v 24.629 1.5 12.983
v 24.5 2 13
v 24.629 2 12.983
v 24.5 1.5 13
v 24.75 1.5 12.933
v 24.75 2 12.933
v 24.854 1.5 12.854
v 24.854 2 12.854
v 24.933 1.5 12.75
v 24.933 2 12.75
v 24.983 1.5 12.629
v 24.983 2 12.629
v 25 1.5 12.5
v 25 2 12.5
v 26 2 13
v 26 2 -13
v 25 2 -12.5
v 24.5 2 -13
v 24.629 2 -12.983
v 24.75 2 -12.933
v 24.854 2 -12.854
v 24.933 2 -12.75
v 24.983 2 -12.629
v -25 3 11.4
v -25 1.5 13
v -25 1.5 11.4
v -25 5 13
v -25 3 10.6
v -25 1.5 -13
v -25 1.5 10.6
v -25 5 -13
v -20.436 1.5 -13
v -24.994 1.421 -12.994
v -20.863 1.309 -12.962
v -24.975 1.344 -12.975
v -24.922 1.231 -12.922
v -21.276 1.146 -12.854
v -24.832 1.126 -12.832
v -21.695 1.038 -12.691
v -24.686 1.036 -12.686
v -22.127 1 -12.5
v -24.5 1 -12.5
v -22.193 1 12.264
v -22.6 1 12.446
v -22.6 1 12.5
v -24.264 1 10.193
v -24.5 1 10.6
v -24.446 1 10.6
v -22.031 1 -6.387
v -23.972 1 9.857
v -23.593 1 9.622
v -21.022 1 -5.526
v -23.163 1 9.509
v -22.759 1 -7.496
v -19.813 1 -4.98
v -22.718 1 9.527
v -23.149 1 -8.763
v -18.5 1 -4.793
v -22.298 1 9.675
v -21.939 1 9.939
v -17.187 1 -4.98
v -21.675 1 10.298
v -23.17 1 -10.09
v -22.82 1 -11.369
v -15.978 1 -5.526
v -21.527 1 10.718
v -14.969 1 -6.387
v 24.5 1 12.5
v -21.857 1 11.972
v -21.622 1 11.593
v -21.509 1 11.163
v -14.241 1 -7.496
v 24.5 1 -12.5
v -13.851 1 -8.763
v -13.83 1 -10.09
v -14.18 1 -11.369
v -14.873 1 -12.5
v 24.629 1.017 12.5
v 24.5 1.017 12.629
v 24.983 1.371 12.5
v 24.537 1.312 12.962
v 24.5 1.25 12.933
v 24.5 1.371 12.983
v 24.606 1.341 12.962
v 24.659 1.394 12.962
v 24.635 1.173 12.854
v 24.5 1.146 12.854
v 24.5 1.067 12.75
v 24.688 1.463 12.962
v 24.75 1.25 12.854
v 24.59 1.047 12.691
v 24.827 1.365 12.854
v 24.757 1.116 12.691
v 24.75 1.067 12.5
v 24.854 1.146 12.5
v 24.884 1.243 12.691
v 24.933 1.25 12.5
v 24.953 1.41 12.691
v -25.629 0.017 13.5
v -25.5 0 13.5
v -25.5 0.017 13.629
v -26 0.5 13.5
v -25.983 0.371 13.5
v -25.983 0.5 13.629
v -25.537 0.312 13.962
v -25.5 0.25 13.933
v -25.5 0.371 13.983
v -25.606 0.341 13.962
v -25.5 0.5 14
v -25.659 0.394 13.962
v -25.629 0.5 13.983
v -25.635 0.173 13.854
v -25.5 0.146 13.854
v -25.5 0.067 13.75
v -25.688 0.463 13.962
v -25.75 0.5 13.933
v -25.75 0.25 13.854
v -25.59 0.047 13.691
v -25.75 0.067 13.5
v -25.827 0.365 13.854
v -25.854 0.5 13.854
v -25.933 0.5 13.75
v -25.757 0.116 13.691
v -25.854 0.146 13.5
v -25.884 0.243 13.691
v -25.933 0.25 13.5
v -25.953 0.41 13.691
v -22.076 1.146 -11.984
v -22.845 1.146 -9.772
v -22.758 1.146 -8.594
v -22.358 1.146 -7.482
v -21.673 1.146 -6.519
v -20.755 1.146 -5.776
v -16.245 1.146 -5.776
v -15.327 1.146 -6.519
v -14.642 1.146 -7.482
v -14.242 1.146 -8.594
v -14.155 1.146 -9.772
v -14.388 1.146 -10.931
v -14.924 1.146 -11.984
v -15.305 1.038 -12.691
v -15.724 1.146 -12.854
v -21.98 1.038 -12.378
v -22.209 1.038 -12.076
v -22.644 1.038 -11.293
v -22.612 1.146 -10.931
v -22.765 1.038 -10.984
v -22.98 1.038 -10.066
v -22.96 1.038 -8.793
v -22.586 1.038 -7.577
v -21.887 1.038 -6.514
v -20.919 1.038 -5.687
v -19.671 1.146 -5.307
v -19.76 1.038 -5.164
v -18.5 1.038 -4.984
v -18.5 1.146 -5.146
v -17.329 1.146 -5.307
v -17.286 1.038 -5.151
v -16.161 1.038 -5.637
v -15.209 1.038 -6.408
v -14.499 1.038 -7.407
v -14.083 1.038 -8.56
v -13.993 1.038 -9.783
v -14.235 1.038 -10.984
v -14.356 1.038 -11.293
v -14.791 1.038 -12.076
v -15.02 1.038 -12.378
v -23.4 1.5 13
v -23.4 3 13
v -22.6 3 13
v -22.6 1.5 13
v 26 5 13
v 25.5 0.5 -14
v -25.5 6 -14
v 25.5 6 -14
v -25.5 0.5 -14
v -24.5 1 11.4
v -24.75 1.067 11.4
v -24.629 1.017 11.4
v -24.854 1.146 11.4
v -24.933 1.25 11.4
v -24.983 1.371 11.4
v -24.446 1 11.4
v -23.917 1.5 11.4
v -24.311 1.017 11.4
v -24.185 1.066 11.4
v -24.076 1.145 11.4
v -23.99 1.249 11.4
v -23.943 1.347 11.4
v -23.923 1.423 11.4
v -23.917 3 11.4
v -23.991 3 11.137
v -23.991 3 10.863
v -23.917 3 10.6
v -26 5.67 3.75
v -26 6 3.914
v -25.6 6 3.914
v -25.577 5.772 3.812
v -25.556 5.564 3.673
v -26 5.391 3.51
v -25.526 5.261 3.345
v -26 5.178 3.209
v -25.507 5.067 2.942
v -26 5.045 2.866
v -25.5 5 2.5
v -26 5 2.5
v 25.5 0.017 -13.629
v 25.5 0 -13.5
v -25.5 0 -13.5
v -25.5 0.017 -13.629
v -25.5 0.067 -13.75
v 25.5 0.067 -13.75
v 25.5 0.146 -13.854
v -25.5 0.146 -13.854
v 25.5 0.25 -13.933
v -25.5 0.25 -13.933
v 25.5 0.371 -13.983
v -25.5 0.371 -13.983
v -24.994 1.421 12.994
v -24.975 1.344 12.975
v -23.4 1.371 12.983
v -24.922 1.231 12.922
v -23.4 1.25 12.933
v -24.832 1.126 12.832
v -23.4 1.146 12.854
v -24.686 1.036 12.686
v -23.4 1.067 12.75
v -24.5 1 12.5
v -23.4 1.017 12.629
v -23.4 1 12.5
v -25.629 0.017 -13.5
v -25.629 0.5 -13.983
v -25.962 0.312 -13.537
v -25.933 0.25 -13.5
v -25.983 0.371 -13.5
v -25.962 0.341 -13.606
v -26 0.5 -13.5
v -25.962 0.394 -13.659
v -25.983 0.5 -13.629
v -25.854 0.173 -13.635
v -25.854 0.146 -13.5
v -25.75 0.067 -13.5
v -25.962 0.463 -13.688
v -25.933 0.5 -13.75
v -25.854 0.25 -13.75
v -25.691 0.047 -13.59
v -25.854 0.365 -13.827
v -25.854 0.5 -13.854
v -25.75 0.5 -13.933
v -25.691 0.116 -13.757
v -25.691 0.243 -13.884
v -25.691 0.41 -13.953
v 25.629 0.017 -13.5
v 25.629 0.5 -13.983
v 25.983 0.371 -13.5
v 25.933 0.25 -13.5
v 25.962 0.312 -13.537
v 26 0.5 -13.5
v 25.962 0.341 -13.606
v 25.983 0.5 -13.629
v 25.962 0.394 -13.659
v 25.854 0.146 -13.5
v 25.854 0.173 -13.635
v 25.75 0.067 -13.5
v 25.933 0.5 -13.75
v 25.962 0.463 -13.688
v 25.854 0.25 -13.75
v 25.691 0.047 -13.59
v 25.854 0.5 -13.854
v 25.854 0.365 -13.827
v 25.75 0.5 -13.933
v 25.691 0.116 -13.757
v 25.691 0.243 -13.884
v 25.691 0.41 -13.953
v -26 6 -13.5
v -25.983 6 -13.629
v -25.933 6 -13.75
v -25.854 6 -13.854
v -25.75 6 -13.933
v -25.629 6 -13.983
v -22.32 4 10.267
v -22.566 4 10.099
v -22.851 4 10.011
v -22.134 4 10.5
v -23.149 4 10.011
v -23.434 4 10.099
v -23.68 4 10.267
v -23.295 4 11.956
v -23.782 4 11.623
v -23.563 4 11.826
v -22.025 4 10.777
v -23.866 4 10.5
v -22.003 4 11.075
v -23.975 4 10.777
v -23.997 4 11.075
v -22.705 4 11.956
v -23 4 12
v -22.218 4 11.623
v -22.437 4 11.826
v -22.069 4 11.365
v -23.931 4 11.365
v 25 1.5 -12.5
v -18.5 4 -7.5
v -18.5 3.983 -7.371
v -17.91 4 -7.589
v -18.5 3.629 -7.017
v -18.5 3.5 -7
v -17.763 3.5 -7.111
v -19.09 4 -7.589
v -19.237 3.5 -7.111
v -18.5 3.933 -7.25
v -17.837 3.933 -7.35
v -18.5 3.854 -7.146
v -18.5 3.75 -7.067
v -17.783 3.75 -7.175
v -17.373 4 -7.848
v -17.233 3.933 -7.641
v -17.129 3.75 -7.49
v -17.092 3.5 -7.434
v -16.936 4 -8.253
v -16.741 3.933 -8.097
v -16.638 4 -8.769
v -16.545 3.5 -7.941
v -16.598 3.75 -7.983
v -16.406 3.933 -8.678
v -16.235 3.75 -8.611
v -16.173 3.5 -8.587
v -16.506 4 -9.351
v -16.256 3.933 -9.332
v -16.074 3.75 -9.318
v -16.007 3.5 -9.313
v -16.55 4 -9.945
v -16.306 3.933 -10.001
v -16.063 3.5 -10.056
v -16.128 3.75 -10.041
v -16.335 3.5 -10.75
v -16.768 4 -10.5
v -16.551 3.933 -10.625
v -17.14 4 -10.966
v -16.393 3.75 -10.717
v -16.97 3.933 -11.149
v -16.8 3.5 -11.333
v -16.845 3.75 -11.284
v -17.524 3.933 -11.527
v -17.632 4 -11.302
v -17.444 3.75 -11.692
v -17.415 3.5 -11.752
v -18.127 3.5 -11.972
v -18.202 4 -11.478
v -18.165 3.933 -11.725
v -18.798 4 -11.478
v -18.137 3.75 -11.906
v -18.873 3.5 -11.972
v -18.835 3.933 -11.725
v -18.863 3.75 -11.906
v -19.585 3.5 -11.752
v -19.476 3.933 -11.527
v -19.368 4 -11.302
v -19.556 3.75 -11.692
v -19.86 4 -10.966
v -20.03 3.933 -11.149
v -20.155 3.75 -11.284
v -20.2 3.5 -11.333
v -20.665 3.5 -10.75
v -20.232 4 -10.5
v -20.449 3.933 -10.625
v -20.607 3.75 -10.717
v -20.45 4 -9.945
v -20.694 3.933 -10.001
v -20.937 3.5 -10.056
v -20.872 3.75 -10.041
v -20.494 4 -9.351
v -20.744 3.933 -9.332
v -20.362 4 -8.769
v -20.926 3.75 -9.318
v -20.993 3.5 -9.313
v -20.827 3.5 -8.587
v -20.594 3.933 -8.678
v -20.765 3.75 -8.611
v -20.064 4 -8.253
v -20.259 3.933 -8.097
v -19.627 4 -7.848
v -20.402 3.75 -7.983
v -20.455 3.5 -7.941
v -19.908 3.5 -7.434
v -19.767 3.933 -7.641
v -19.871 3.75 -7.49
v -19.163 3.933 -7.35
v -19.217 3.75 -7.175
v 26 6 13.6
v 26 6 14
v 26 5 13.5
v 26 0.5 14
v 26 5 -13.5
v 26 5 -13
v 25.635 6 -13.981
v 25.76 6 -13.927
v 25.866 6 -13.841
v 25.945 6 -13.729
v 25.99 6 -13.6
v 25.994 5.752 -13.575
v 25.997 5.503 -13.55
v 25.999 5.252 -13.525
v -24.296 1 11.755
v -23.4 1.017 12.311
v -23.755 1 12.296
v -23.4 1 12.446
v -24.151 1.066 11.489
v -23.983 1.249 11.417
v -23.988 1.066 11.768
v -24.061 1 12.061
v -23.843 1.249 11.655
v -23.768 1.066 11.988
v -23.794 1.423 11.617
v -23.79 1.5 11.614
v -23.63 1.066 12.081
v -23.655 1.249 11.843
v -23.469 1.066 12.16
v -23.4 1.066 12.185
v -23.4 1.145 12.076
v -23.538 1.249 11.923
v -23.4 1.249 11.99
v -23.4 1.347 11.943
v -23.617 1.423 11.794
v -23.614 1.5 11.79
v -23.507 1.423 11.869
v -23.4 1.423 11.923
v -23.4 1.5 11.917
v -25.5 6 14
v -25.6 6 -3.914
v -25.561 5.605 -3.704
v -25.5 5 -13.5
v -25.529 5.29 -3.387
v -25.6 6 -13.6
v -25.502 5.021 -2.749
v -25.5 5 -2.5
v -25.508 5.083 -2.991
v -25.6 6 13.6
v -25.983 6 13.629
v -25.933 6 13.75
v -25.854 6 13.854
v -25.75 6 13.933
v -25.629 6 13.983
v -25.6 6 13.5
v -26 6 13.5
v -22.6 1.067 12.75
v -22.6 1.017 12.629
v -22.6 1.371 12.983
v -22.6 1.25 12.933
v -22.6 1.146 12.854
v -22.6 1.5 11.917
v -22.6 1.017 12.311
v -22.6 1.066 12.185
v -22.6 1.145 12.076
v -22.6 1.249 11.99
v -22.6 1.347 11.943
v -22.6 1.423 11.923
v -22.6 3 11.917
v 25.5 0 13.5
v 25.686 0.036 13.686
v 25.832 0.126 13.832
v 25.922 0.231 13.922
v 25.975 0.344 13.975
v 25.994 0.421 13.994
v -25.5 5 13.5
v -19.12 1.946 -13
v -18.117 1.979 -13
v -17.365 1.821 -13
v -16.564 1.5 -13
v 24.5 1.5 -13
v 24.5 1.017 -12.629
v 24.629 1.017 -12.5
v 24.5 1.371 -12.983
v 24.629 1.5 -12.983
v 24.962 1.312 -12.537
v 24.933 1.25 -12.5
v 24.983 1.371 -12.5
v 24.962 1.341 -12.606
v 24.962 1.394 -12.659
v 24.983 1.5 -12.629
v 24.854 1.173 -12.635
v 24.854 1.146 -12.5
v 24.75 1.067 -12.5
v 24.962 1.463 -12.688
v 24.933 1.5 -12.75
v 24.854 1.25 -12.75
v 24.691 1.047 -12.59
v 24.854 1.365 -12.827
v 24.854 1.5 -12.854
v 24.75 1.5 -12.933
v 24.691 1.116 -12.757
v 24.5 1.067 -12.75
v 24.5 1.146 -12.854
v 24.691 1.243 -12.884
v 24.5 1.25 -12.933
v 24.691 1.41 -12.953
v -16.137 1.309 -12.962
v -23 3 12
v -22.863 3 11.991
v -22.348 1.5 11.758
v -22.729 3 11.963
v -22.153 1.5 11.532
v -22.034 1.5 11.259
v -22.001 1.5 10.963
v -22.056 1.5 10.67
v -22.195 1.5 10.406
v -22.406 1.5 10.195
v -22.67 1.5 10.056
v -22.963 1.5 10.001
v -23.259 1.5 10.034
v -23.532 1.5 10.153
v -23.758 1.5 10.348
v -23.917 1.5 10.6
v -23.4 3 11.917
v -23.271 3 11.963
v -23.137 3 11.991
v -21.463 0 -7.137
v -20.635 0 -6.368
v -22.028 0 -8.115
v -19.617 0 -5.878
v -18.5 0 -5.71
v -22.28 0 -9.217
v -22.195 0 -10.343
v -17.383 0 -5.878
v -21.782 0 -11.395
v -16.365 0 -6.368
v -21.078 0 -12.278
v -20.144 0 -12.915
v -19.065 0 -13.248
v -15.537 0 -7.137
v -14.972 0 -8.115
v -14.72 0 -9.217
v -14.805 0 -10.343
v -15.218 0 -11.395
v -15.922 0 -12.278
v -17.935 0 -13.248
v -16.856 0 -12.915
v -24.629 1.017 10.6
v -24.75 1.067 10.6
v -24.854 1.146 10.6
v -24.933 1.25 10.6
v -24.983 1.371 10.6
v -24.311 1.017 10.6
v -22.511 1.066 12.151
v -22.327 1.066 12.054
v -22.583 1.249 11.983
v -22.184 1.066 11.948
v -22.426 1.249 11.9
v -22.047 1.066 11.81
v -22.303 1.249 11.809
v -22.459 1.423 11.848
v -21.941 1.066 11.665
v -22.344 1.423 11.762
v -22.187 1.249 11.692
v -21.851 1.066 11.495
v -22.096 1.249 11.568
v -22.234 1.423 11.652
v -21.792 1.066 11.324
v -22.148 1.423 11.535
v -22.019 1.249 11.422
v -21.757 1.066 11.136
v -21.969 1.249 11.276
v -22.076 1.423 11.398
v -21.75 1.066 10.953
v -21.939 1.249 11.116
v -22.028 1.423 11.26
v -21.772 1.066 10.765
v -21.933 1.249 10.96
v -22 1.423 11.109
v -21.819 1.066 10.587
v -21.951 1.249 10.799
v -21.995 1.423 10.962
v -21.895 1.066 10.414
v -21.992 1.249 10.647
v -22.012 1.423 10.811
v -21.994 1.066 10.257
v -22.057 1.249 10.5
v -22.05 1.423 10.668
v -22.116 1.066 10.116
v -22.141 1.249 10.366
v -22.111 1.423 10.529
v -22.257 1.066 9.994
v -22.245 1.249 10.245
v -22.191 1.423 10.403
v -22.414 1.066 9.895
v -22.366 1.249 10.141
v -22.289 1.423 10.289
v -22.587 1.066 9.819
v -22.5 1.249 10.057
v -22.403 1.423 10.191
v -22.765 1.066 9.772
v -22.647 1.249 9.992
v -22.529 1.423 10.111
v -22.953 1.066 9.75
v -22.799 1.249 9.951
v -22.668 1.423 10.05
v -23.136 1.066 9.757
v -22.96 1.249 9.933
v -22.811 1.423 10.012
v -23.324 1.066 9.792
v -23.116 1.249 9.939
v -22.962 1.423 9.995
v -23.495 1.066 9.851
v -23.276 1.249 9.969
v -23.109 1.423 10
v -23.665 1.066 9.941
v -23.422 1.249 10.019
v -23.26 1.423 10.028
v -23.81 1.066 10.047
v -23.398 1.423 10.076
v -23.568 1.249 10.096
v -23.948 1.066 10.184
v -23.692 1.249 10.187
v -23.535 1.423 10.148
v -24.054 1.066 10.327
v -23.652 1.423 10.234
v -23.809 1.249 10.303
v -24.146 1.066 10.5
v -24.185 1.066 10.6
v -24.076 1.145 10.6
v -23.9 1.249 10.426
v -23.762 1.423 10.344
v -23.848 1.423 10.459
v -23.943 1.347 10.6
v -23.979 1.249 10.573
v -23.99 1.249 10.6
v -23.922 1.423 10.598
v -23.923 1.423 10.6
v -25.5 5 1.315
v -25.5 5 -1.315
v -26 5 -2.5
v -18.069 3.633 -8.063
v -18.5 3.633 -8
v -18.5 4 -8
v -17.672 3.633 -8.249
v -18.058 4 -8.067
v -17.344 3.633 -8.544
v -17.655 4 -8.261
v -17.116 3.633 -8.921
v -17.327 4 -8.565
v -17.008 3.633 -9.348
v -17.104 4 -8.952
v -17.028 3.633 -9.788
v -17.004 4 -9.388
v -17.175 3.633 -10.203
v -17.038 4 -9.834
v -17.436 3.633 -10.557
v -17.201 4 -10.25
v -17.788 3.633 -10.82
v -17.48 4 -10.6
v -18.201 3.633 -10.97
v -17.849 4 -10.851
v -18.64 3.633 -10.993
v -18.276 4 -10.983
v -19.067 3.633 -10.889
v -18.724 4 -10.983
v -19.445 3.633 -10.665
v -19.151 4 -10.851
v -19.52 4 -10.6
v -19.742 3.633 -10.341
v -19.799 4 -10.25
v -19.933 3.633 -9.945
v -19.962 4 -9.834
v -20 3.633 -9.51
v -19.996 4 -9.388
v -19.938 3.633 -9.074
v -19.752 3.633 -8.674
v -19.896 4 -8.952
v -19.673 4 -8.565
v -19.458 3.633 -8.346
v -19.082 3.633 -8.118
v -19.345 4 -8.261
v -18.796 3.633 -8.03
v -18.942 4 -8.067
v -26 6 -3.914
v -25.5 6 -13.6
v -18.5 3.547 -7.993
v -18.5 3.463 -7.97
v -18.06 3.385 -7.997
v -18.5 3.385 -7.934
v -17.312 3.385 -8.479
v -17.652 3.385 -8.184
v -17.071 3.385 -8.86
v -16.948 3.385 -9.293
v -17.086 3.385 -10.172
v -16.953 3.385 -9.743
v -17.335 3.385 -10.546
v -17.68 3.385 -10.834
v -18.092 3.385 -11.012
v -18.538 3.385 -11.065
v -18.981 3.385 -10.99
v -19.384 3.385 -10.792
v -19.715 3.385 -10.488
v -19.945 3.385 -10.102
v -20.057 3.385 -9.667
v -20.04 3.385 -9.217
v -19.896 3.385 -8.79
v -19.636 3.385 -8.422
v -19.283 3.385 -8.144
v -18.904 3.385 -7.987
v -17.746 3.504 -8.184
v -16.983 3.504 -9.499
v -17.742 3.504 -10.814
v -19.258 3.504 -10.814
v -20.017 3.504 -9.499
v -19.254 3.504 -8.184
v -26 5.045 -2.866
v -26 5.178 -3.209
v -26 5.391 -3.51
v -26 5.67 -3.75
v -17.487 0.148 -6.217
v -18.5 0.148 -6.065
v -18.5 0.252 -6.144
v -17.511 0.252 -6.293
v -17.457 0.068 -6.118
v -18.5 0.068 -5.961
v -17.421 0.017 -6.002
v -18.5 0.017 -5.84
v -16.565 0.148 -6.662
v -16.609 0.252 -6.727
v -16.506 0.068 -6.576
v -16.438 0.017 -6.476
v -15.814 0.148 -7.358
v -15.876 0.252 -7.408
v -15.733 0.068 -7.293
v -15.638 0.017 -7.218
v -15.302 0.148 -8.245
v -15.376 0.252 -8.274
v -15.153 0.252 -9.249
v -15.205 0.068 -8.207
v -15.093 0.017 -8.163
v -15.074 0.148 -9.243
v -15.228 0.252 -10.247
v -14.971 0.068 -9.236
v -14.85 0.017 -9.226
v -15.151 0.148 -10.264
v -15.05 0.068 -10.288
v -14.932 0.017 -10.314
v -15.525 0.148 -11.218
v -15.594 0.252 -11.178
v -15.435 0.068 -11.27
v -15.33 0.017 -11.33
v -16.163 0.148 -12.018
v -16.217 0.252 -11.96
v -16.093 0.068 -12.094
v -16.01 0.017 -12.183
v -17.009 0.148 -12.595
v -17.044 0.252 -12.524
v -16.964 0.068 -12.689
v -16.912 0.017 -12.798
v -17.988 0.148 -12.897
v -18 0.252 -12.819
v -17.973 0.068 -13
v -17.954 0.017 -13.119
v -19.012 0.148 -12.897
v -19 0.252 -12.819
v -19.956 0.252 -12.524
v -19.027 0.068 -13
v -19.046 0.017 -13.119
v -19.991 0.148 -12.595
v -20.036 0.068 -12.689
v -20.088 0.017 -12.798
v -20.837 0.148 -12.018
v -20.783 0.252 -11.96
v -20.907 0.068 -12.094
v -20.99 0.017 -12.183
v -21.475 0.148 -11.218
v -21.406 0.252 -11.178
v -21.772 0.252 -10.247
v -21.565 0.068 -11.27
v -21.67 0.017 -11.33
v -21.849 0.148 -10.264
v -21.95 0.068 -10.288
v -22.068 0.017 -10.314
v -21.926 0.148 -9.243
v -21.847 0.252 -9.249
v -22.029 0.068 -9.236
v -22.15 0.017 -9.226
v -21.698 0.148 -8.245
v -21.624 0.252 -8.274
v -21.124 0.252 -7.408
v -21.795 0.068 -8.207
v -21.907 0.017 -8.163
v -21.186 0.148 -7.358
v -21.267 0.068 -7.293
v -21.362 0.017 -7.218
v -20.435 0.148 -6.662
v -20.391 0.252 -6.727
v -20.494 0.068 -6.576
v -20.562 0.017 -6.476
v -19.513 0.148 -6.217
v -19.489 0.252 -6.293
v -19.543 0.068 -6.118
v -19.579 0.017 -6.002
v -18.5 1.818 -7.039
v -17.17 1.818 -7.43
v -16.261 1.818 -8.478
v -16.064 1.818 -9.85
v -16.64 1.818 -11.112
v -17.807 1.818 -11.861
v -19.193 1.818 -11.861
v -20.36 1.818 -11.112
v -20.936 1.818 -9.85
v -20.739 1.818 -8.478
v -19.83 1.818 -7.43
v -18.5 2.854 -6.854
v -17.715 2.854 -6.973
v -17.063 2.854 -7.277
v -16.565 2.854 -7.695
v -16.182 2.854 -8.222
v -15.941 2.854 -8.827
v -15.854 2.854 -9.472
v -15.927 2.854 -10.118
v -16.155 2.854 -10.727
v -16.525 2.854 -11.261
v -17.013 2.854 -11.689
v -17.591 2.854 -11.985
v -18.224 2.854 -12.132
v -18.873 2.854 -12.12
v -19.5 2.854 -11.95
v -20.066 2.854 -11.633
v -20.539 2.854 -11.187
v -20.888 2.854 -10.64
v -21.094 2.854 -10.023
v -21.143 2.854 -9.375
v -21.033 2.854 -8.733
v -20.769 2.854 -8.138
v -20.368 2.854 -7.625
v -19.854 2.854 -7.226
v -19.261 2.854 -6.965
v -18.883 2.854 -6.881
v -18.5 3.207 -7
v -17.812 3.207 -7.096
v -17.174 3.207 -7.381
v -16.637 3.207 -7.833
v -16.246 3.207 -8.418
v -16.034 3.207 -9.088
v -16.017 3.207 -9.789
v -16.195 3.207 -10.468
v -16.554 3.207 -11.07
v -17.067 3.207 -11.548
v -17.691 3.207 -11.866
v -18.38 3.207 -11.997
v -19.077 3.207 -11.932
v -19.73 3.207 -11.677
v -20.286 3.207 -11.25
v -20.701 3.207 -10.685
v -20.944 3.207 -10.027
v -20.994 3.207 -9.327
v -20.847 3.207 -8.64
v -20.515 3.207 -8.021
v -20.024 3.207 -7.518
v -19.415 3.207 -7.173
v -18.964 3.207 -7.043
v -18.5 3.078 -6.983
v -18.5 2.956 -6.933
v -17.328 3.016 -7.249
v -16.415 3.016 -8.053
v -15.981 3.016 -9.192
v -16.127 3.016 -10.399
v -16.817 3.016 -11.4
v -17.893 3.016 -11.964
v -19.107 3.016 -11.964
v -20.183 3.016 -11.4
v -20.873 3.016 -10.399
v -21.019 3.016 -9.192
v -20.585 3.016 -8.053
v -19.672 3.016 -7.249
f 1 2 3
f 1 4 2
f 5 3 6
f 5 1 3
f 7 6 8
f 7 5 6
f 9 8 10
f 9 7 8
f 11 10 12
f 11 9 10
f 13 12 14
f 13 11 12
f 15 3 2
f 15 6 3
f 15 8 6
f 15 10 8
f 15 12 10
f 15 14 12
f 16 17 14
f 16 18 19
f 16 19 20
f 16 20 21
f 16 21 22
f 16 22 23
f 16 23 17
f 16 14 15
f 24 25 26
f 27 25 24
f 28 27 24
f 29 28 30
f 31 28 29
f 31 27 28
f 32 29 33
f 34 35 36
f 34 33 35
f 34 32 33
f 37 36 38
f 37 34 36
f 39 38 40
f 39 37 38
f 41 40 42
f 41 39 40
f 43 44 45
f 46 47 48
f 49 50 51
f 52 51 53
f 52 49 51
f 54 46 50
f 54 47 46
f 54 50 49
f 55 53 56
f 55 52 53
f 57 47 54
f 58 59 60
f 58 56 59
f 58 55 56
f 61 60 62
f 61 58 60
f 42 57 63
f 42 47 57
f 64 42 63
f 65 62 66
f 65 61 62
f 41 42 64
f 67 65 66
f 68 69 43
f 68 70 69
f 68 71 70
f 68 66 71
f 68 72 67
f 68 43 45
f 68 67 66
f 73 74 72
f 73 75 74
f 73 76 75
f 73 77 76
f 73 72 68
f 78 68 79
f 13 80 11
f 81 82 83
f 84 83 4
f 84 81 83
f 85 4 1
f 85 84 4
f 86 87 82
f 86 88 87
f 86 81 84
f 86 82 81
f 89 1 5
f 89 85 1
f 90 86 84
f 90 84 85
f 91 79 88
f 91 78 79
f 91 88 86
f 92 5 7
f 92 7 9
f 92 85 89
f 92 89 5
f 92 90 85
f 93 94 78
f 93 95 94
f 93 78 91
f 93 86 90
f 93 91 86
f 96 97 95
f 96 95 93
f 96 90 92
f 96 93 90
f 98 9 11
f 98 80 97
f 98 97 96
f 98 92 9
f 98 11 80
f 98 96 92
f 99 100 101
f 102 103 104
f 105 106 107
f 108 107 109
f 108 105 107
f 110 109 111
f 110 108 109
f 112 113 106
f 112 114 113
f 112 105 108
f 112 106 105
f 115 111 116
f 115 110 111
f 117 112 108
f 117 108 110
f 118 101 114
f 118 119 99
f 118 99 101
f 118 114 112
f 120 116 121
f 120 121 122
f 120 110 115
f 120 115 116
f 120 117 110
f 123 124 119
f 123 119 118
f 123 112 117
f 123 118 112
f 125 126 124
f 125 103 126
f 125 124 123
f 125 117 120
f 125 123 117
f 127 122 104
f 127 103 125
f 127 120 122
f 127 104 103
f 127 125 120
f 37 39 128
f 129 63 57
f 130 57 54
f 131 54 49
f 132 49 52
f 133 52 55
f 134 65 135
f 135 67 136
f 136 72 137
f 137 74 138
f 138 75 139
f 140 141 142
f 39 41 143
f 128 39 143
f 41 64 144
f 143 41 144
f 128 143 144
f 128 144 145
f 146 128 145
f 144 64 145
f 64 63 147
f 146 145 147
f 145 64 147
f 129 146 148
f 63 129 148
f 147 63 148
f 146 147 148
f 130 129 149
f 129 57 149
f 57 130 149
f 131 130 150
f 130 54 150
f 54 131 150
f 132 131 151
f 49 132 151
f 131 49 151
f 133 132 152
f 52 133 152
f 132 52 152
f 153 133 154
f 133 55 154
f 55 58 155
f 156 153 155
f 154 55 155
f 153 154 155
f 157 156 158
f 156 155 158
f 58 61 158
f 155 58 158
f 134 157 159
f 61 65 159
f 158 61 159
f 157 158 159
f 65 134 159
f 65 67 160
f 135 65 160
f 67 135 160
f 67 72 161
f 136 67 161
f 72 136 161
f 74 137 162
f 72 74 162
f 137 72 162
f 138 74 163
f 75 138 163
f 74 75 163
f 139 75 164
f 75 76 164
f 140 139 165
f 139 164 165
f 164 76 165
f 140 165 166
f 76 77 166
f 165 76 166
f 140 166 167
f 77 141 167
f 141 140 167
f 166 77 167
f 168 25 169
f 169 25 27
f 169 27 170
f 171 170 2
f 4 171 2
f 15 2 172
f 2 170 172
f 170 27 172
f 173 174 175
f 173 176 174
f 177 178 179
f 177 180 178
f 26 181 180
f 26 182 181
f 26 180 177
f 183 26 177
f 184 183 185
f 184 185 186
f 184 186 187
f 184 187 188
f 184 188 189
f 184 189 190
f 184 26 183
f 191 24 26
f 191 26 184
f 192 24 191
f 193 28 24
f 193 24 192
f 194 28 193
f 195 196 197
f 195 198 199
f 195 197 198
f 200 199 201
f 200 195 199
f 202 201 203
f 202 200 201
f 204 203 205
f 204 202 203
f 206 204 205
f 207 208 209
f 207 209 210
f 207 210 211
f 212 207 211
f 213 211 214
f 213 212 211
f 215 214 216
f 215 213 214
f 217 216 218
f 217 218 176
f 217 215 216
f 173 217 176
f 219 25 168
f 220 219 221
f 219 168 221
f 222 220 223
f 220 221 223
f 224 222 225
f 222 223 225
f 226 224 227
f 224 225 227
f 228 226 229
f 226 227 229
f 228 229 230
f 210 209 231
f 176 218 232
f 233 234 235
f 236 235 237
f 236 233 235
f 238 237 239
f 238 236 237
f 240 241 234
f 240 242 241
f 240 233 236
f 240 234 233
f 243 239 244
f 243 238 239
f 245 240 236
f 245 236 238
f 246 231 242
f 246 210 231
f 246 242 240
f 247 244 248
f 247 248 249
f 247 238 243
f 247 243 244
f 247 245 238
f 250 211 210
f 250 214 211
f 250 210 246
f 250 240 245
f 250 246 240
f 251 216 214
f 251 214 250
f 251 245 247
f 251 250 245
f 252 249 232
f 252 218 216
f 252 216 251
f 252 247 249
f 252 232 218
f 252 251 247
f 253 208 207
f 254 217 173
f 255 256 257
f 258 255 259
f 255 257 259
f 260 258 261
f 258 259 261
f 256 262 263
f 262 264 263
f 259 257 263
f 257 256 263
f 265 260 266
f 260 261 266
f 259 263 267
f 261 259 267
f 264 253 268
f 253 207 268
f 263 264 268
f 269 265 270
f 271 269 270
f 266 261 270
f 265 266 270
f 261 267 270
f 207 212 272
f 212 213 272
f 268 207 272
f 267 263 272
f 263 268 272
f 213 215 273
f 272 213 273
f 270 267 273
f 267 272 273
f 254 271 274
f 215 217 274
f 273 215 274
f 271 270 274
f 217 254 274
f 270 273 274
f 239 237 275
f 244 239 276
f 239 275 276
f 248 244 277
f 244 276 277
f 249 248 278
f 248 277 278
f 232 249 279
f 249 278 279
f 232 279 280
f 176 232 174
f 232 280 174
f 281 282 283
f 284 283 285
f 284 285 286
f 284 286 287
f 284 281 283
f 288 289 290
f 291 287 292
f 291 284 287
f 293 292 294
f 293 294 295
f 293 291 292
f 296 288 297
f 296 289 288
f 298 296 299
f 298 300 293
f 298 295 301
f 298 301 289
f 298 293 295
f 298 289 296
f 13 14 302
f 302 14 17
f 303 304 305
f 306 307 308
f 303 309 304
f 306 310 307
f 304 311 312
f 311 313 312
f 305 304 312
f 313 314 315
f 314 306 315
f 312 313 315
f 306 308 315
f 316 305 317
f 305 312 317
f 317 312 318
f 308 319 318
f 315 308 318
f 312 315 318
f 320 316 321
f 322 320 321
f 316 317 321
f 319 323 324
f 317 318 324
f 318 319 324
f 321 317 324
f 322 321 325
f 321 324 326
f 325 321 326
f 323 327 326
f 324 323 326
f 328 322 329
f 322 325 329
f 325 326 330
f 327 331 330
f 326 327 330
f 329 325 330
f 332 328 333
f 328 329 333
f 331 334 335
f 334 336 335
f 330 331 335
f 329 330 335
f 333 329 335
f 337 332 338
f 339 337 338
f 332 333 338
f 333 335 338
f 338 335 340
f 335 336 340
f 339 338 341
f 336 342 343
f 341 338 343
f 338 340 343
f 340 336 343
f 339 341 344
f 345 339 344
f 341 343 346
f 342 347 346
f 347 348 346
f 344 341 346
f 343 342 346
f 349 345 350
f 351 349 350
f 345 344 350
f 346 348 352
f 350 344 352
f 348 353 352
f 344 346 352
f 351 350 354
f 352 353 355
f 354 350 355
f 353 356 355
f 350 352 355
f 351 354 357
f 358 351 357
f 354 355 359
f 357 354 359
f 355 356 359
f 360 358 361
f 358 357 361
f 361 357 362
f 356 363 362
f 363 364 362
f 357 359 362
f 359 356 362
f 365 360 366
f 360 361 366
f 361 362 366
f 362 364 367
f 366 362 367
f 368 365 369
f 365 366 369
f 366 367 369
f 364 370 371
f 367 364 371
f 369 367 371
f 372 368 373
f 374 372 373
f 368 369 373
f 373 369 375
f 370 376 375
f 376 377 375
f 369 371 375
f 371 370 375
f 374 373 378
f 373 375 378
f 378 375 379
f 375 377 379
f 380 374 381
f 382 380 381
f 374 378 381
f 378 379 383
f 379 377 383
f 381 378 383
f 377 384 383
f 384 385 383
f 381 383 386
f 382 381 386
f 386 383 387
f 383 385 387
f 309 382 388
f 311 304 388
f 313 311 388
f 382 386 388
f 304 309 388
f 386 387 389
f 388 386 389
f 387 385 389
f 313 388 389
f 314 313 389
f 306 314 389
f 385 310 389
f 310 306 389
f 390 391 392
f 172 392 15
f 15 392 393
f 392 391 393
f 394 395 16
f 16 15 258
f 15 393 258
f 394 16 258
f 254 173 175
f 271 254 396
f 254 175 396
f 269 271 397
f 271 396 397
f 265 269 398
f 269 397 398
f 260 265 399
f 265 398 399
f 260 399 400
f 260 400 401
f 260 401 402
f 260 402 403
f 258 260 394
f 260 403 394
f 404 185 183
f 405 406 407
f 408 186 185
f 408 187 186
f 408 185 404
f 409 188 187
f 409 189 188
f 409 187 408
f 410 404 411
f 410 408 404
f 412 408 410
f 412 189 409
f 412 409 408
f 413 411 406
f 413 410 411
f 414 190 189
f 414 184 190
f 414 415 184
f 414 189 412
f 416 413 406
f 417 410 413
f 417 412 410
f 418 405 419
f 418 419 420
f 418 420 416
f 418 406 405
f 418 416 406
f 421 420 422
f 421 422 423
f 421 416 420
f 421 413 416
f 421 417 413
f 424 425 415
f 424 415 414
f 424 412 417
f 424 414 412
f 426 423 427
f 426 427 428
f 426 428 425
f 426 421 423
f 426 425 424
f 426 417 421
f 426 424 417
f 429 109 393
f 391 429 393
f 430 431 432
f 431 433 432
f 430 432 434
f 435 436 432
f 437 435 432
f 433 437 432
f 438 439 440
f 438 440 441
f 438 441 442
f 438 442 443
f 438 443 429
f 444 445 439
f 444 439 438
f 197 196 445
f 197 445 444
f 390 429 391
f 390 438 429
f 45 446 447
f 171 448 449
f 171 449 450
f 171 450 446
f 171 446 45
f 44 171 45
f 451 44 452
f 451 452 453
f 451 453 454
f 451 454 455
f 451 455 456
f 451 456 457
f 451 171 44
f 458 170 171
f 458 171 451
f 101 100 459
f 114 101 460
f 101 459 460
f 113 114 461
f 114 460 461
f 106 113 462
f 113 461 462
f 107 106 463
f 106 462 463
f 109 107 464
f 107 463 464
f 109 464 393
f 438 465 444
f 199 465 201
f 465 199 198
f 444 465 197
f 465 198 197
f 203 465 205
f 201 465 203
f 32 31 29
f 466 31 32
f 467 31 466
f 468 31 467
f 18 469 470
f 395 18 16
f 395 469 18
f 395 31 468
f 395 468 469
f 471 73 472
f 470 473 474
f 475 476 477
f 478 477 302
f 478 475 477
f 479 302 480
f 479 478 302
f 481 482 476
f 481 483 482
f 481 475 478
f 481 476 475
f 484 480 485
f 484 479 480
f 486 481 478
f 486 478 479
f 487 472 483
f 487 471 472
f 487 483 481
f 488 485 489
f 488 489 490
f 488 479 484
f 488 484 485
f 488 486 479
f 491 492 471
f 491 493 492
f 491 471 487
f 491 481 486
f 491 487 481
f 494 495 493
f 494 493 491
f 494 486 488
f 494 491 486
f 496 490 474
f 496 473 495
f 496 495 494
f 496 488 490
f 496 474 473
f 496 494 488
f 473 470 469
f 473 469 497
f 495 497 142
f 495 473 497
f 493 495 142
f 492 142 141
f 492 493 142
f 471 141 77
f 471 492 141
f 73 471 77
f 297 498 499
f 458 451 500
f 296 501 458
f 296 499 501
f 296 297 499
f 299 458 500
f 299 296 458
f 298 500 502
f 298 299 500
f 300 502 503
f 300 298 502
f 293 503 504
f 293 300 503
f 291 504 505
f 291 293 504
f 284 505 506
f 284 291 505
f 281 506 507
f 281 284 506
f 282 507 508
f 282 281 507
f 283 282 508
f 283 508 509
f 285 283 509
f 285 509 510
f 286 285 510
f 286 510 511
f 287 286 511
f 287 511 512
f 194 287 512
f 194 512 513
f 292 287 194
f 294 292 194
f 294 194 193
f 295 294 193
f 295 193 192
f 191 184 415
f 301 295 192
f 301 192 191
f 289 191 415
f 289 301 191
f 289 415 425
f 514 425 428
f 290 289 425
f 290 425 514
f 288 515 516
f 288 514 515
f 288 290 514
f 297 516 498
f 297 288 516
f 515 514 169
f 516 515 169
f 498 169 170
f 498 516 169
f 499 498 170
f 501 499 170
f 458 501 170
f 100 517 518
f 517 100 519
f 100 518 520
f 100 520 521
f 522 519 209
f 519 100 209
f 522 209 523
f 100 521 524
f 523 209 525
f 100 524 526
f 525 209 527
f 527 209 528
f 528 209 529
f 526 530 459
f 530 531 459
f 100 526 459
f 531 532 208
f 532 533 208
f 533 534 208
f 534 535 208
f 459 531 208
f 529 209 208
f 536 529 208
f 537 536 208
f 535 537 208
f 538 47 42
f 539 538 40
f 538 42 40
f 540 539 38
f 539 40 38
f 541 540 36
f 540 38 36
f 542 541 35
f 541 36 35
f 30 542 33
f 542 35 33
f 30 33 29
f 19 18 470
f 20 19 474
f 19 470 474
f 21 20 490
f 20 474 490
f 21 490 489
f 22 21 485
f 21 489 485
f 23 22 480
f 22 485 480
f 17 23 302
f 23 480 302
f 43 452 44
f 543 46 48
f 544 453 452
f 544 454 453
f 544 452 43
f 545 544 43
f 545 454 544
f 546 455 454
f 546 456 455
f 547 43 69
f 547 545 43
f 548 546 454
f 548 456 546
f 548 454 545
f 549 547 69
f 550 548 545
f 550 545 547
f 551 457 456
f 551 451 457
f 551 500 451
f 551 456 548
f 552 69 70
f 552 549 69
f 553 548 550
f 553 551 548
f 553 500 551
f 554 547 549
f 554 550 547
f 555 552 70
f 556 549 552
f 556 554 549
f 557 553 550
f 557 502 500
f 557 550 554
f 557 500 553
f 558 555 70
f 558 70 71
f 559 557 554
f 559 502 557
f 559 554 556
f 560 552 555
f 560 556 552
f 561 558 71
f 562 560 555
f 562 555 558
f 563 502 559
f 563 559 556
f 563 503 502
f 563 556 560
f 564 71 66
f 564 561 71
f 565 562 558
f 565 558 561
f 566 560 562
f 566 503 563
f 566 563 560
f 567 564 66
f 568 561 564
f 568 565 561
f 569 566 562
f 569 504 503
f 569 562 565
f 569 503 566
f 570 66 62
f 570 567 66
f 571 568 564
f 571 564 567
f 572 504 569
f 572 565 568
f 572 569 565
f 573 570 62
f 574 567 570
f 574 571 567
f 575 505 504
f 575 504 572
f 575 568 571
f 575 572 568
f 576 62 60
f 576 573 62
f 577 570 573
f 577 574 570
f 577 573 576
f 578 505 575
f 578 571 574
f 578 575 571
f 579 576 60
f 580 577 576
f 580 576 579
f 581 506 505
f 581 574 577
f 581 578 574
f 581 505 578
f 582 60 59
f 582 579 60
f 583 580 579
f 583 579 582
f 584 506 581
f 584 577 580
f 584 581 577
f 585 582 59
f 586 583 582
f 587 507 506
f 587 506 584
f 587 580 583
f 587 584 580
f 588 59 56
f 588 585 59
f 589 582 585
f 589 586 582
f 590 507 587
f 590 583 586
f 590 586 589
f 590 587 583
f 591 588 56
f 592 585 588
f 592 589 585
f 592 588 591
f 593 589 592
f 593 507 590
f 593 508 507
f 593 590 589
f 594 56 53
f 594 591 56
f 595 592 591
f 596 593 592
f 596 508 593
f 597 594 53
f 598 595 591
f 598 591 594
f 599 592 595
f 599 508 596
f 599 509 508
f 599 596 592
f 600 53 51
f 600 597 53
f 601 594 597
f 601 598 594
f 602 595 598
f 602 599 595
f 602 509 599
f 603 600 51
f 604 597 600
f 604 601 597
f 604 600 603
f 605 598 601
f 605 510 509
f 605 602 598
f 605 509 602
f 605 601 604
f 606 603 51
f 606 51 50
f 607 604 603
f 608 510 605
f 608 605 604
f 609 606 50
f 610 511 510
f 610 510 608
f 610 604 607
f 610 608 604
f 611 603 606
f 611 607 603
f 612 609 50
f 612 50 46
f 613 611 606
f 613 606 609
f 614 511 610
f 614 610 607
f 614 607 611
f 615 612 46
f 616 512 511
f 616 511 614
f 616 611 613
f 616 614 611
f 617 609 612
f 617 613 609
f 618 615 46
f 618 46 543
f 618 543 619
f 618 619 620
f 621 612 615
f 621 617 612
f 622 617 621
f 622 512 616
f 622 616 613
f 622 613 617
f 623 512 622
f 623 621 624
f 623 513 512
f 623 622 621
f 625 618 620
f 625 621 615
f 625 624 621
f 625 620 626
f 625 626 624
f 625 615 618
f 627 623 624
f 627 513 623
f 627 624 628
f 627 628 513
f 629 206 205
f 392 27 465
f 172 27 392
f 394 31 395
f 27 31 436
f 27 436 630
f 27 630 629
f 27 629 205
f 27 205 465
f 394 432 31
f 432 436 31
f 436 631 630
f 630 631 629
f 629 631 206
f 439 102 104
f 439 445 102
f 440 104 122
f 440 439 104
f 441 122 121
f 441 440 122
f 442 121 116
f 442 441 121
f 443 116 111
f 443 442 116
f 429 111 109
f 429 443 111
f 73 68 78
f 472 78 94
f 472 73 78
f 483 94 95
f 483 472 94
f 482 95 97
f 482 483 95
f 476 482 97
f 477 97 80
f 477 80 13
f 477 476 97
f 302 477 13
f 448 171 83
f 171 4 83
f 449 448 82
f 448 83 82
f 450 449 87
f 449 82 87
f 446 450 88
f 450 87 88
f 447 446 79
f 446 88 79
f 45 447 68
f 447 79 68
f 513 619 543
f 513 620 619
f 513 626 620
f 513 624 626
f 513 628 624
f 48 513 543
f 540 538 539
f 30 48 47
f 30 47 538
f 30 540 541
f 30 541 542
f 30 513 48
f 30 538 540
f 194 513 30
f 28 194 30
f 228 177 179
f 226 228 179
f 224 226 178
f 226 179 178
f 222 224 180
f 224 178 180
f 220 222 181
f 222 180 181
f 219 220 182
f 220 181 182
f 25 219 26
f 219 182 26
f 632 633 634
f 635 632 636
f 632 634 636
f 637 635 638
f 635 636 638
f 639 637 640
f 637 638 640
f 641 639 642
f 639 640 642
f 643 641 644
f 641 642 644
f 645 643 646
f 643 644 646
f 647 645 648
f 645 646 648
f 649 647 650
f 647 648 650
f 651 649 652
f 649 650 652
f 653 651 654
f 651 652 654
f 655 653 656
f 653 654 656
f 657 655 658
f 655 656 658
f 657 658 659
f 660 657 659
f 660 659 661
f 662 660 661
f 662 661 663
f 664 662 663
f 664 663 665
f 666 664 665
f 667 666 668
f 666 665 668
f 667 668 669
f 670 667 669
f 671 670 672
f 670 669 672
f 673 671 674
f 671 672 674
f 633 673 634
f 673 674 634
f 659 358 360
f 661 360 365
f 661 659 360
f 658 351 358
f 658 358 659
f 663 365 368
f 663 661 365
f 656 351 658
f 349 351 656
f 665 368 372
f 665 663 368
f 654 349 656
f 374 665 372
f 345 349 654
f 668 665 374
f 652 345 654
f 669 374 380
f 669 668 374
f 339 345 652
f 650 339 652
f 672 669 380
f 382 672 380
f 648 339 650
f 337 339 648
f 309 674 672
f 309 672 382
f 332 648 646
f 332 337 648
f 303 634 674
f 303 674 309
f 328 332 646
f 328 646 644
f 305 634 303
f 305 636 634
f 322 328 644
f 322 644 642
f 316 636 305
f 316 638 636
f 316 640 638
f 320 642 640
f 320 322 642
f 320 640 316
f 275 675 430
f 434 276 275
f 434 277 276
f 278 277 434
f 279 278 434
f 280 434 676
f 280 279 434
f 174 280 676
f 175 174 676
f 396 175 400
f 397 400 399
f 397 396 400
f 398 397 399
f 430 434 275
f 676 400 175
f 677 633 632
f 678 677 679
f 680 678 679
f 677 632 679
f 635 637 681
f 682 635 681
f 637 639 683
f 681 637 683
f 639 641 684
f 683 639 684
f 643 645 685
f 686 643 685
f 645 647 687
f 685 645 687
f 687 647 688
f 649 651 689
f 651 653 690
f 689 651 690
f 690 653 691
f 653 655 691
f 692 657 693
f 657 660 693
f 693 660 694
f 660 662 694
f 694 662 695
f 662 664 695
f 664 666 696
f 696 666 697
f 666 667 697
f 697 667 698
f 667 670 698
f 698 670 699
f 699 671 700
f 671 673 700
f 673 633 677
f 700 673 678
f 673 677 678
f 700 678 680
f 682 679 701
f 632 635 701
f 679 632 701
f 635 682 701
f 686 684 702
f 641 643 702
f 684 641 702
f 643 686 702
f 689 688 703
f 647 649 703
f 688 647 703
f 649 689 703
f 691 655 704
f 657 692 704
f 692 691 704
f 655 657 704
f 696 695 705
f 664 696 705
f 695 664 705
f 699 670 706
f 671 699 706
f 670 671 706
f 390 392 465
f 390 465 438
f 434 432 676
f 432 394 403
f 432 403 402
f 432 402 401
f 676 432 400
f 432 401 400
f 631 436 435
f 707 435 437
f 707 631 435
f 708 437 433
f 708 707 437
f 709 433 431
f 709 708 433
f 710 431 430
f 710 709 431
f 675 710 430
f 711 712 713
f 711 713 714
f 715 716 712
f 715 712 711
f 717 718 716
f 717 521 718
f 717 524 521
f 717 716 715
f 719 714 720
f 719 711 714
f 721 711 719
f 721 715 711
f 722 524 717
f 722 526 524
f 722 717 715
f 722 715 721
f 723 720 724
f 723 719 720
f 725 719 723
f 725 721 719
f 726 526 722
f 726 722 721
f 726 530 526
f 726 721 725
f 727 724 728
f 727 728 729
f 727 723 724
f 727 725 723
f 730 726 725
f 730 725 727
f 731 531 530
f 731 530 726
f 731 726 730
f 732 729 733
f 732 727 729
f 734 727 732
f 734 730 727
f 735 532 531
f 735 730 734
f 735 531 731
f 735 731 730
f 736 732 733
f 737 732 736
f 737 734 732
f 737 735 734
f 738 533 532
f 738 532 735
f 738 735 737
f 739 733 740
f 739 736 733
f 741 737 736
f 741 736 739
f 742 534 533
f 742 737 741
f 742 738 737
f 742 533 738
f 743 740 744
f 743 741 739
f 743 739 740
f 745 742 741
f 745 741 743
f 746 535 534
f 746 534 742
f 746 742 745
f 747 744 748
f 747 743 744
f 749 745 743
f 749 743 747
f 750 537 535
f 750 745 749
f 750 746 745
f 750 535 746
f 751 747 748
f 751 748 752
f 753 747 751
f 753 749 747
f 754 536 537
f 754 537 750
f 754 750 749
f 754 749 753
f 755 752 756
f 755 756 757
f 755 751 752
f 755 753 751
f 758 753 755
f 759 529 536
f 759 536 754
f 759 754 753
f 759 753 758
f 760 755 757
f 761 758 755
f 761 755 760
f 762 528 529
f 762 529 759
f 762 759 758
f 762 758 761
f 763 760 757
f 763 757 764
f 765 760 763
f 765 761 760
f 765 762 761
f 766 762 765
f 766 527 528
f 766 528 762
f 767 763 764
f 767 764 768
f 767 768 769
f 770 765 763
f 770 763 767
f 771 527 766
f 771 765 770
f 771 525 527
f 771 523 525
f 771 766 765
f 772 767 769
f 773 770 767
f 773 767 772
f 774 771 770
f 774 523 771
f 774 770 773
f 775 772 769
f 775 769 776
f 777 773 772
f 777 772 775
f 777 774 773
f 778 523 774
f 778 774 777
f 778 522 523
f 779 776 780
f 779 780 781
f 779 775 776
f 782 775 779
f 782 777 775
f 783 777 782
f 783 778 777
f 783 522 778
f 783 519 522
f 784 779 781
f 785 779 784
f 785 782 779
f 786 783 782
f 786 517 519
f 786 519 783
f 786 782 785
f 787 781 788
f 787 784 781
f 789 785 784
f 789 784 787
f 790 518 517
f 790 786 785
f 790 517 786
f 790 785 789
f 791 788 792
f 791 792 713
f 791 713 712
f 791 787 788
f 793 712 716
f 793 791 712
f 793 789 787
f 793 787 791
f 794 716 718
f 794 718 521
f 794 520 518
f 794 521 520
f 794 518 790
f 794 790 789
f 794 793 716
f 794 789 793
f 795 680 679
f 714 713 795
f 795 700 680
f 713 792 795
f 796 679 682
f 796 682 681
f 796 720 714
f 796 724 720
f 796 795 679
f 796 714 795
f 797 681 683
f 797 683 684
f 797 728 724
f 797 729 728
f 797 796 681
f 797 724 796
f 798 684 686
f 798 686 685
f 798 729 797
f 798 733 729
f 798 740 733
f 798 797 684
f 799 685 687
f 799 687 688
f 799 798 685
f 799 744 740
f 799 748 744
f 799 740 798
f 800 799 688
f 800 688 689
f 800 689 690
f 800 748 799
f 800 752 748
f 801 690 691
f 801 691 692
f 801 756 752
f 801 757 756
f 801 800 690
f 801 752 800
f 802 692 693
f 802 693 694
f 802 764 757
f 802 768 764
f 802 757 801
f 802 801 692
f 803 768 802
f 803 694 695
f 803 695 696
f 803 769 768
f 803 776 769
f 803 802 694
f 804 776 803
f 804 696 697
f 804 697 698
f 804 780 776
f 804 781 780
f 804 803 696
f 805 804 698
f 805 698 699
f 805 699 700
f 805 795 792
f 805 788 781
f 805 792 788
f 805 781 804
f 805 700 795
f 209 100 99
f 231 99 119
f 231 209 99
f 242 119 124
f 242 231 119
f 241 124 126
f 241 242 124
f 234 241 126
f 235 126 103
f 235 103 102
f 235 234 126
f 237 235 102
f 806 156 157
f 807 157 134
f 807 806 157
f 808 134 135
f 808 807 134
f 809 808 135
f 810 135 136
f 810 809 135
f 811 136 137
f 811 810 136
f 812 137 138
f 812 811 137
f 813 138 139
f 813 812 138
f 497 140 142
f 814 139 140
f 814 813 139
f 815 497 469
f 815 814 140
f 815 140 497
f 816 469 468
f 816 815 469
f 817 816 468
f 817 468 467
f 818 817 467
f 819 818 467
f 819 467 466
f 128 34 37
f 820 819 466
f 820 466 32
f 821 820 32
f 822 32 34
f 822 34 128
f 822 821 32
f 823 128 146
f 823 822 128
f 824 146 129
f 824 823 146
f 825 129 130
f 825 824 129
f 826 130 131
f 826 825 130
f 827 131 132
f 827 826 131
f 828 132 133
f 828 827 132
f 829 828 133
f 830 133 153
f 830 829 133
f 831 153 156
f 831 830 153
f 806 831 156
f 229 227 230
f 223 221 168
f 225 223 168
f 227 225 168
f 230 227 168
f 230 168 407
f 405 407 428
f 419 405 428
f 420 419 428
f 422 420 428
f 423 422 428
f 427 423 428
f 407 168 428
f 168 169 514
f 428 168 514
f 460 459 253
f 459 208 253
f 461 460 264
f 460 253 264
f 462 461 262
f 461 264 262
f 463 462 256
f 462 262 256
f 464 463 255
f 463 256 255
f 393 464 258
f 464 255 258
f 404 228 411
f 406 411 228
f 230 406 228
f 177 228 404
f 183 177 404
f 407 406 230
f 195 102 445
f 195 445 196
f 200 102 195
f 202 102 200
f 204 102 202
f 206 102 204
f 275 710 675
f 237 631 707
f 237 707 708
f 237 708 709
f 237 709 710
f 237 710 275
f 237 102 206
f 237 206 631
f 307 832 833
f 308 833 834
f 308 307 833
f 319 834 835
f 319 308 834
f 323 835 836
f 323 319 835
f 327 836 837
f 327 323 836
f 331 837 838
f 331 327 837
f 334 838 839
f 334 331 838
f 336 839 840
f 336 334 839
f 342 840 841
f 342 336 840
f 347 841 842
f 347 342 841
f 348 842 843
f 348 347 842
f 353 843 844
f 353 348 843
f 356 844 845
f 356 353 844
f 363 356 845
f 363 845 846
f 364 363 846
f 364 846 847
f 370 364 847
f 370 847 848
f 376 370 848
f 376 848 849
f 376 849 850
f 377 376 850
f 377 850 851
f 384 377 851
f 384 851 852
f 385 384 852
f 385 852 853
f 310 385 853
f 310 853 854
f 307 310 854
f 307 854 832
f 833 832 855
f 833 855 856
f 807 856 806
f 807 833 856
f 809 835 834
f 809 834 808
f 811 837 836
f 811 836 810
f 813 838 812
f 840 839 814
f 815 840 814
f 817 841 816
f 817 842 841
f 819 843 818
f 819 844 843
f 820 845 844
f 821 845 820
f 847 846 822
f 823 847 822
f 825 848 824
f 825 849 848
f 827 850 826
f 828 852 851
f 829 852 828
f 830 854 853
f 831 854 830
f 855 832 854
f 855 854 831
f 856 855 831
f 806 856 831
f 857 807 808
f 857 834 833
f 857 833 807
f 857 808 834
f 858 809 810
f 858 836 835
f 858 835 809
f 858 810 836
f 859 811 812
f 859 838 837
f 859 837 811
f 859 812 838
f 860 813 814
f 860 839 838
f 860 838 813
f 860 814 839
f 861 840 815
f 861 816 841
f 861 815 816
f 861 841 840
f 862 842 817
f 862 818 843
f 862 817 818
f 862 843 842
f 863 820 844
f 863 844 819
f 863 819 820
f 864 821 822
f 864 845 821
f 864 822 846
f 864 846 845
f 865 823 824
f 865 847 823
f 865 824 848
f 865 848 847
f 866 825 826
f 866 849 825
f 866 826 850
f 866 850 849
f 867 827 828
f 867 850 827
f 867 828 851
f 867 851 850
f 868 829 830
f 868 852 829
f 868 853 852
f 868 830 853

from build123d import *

# Parameters (mm, degrees)
SKETCH_1_W          = 52
SKETCH_1_H          = 28
EXTRUDE_1_DEPTH     = 6
SKETCH_2_W          = 50
SKETCH_2_H          = 26
CUT_EXTRUDE_1_DEPTH = 5
SKETCH_3_W          = 1
SKETCH_3_H          = 26
CUT_EXTRUDE_2_DEPTH = 4
CUT_EXTRUDE_3_REACH = 56.185
SKETCH_6_R          = 1.5
CUT_EXTRUDE_4_DEPTH = 4
EXTRUDE_START       = 3
SKETCH_7_R          = 2.5
SKETCH_7_R_2        = 1.5
SKETCH_7_R_3        = 1
EXTRUDE_3_DEPTH     = 3
CHAMFER_2_SIZE      = 2
CHAMFER_3_SIZE      = 3.5
CHAMFER_3_SIZE2     = 2
FILLET_1_R          = 0.5
FILLET_2_R          = 0.5
EXTRUDE_4_REACH     = 32.799
EXTRUDE_START_2     = -1
SKETCH_9_W          = 0.8
SKETCH_9_H          = 2
CUT_EXTRUDE_5_DEPTH = 1
CHAMFER_4_SIZE      = 1
CHAMFER_4_SIZE_2    = 0.1


# Some blends are built 0.0001 mm under size
with BuildPart() as part:
    # Эскиз1 → Бобышка-Вытянуть1 (new body)
    with BuildSketch(Plane(origin=(0, 0, 0), x_dir=(1, 0, 0), z_dir=(0, 1, 0))):
        Rectangle(SKETCH_1_W, SKETCH_1_H)
    extrude(amount=EXTRUDE_1_DEPTH)

    # Эскиз2 → Вырез-Вытянуть1 (cut)
    with BuildSketch(Plane(origin=(0, 6, 0), x_dir=(1, 0, 0), z_dir=(0, 1, 0))):
        Rectangle(SKETCH_2_W, SKETCH_2_H)
    extrude(amount=-CUT_EXTRUDE_1_DEPTH, mode=Mode.SUBTRACT)

    # Эскиз3 → Вырез-Вытянуть2 (cut)
    with BuildSketch(Plane(origin=(0, 6, 0), x_dir=(1, 0, 0), z_dir=(0, 1, 0))):
        with Locations((25.5, 0)):
            Rectangle(SKETCH_3_W, SKETCH_3_H)
    extrude(amount=-CUT_EXTRUDE_2_DEPTH, mode=Mode.SUBTRACT)

    # Эскиз4 → Вырез-Вытянуть3 (cut, up to next)
    with BuildSketch(Plane.ZY.offset(26), mode=Mode.PRIVATE) as cut_extrude_3_sk1:
        with BuildLine():
            Line((-2.5, 8), (2.5, 8))
            ThreePointArc((2.5, 8), (4, 6.5), (2.5, 5))
            Line((2.5, 5), (-2.5, 5))
            ThreePointArc((-2.5, 5), (-4, 6.5), (-2.5, 8))
        make_face()
    cut_extrude_3_tool1 = extrude(cut_extrude_3_sk1.sketch, amount=-CUT_EXTRUDE_3_REACH, mode=Mode.PRIVATE) & part.part
    add(cut_extrude_3_tool1.solids().sort_by_distance((-26, 6.5, 0))[0], mode=Mode.SUBTRACT)

    # Эскиз6 → Вырез-Вытянуть4 (cut)
    with BuildSketch(Plane(origin=(0, 1, 0), x_dir=(1, 0, 0), z_dir=(0, 1, 0))):
        with Locations(Location((-18.5, 9.5, 0), (0, 0, 270))):
            Circle(SKETCH_6_R)
    extrude(amount=-CUT_EXTRUDE_4_DEPTH, mode=Mode.SUBTRACT)

    # Эскиз7 → Бобышка-Вытянуть3 (add)
    # profile 1 of 2: a face of its own
    with BuildSketch(Plane(origin=(0, 1, 0), x_dir=(1, 0, 0), z_dir=(0, 1, 0)).offset(EXTRUDE_START)):
        with Locations(Location((-18.5, 9.5, 0), (0, 0, 270))):
            Circle(SKETCH_7_R)
        with Locations(Location((-18.5, 9.5, 0), (0, 0, 270))):
            Circle(SKETCH_7_R_2, mode=Mode.SUBTRACT)
    # profile 2 of 2: a face of its own
    with BuildSketch(Plane(origin=(0, 1, 0), x_dir=(1, 0, 0), z_dir=(0, 1, 0)).offset(EXTRUDE_START)):
        with Locations(Location((-23, -11, 0), (0, 0, 270))):
            Circle(SKETCH_7_R_3)
    extrude(amount=-EXTRUDE_3_DEPTH)

    # Фаска2
    # the kernel refuses this chamfer: 2 mm, written as the material it adds along each edge
    with BuildSketch(Plane(origin=(-18.5, 1, -9.5), x_dir=(0, 0, 1), z_dir=(-1, 0, 0))) as chamfer_2_piece_1:
        Polygon((2.5 + CHAMFER_2_SIZE, 0), (2.5, CHAMFER_2_SIZE), (2.5, 0), align=None)
    revolve(axis=Axis((-18.5, 1, -9.5), (0, 1, 0)))

    # Фаска3
    chamfer_3_edges = [part.edges().sort_by_distance(p)[0] for p in [
        (-18.5, 0, -11),
    ]]
    chamfer_3_side = [part.faces().sort_by_distance(p)[0] for p in [
        (-18.5, 2, -11),
    ]]
    chamfer(chamfer_3_edges, length=CHAMFER_3_SIZE, length2=CHAMFER_3_SIZE2, reference=chamfer_3_side[0])

    # Скругление1
    fillet_1_edges = [part.edges().sort_by_distance(p)[0] for p in [
        (-25, 1, 0),
        (4.664213562, 1, -13),
        (-23.164213562, 1, -13),
        (25, 1, 0),
        (0, 1, 13),
        (-22.742640687, 1, -8),
        (0, 0, -14),
        (-26, 0, 0),
        (0, 0, 14),
        (26, 0, 0),
        (-18.5, 0, -13),
        (-18.5, 4, -12),
        (-18.5, 3, -12),
        (25, 1.5, -13),
        (25, 1.5, 13),
        (26, 3, -14),
        (-26, 3, -14),
        (-26, 3, 14),
        (-18.5, 3.5, -11),
    ]]
    fillet(fillet_1_edges, radius=FILLET_1_R)

    # Скругление2
    fillet_2_edges = [part.edges().sort_by_distance(p)[0] for p in [
        (-23, 1, 10),
    ]]
    fillet(fillet_2_edges, radius=FILLET_2_R - 0.0001)  # a hair under: the kernel refuses the full size

    # Эскиз9 → Бобышка-Вытянуть4 (add, up to next)
    with BuildSketch(Plane(origin=(0, 4, 0), x_dir=(1, 0, 0), z_dir=(0, 1, 0)).offset(EXTRUDE_START_2), mode=Mode.PRIVATE) as extrude_4_sk1:
        with Locations((-23, -12)):
            Rectangle(SKETCH_9_W, SKETCH_9_H)
    extrude_4_tool1 = extrude(extrude_4_sk1.sketch, amount=-EXTRUDE_4_REACH, mode=Mode.PRIVATE) - part.part
    # Эскиз9 → Бобышка-Вытянуть4 (add, up to next)
    with BuildSketch(Plane(origin=(0, 4, 0), x_dir=(1, 0, 0), z_dir=(0, 1, 0)).offset(EXTRUDE_START_2), mode=Mode.PRIVATE) as extrude_4_sk2:
        Polygon((-25, -11), (-25, -11.4), (-23, -11.4), (-23, -11), (-23, -10.6), (-25, -10.6), align=None)
    extrude_4_tool2 = extrude(extrude_4_sk2.sketch, amount=-EXTRUDE_4_REACH, mode=Mode.PRIVATE) - part.part
    add(extrude_4_tool1.solids().sort_by_distance((-23, 3, 12))[0])
    add(extrude_4_tool2.solids().sort_by_distance((-24, 3, 11))[0])

    # Эскиз10 → Вырез-Вытянуть5 (cut)
    with BuildSketch(Plane(origin=(0, 6, 0), x_dir=(1, 0, 0), z_dir=(0, 1, 0))):
        Polygon((26, 13), (26, 13.5), (-25.5, 13.5), (-25.5, -13.5), (26, -13.5), (26, -13), (-25, -13), (-25, 13), align=None)
    extrude(amount=-CUT_EXTRUDE_5_DEPTH, mode=Mode.SUBTRACT)

    # Фаска4
    # the kernel refuses this chamfer: 1, 0.1 mm, written as the material it takes off along each edge
    with BuildSketch(Plane(origin=(-25.5, 6, -16.099522763), x_dir=(0, -1, 0), z_dir=(0, 0, 1))) as chamfer_4_piece_1_section:
        Polygon((CHAMFER_4_SIZE, 0), (0, -CHAMFER_4_SIZE_2), (0, 0), align=None)
    chamfer_4_piece_1 = extrude(amount=14.784831964, mode=Mode.PRIVATE)
    chamfer_4_piece_1 = split(chamfer_4_piece_1, bisect_by=Plane(origin=(-25.5, 6.247477501, -13.62474775), z_dir=(0, 0.09950371902099857, 0.9950371902099893)), keep=Keep.TOP, mode=Mode.PRIVATE)
    add(chamfer_4_piece_1, mode=Mode.SUBTRACT)
    with BuildSketch(Plane(origin=(28.599522763, 6, -13.5), x_dir=(0, -1, 0), z_dir=(-1, 0, 0))) as chamfer_4_piece_2_section:
        Polygon((CHAMFER_4_SIZE, 0), (0, -CHAMFER_4_SIZE_2), (0, 0), align=None)
    chamfer_4_piece_2 = extrude(amount=56.699045526, mode=Mode.PRIVATE)
    chamfer_4_piece_2 = split(chamfer_4_piece_2, bisect_by=Plane(origin=(-25.063371062, 0.633710618, -13.5), z_dir=(0.995037190209989, 0.09950371902100032, 0)), keep=Keep.TOP, mode=Mode.PRIVATE)
    add(chamfer_4_piece_2, mode=Mode.SUBTRACT)
    with BuildSketch(Plane(origin=(-28.099522763, 6, 13.5), x_dir=(0, -1, 0), z_dir=(1, 0, 0))) as chamfer_4_piece_3_section:
        Polygon((CHAMFER_4_SIZE, 0), (0, -CHAMFER_4_SIZE_2), (0, 0), align=None)
    chamfer_4_piece_3 = extrude(amount=56.699045526, mode=Mode.PRIVATE)
    chamfer_4_piece_3 = split(chamfer_4_piece_3, bisect_by=Plane(origin=(-25.62474775, 6.247477501, 13.5), z_dir=(0.995037190209989, 0.09950371902100032, 0)), keep=Keep.TOP, mode=Mode.PRIVATE)
    add(chamfer_4_piece_3, mode=Mode.SUBTRACT)
    with BuildSketch(Plane(origin=(-25.5, 6, 1.314690799), x_dir=(0, -1, 0), z_dir=(0, 0, 1))) as chamfer_4_piece_4_section:
        Polygon((CHAMFER_4_SIZE, 0), (0, -CHAMFER_4_SIZE_2), (0, 0), align=None)
    chamfer_4_piece_4 = extrude(amount=14.784831964, mode=Mode.PRIVATE)
    chamfer_4_piece_4 = split(chamfer_4_piece_4, bisect_by=Plane(origin=(-25.5, 4.783632752, 13.478363275), z_dir=(0, 0.09950371902099857, -0.9950371902099893)), keep=Keep.TOP, mode=Mode.PRIVATE)
    add(chamfer_4_piece_4, mode=Mode.SUBTRACT)


solid = part.part
